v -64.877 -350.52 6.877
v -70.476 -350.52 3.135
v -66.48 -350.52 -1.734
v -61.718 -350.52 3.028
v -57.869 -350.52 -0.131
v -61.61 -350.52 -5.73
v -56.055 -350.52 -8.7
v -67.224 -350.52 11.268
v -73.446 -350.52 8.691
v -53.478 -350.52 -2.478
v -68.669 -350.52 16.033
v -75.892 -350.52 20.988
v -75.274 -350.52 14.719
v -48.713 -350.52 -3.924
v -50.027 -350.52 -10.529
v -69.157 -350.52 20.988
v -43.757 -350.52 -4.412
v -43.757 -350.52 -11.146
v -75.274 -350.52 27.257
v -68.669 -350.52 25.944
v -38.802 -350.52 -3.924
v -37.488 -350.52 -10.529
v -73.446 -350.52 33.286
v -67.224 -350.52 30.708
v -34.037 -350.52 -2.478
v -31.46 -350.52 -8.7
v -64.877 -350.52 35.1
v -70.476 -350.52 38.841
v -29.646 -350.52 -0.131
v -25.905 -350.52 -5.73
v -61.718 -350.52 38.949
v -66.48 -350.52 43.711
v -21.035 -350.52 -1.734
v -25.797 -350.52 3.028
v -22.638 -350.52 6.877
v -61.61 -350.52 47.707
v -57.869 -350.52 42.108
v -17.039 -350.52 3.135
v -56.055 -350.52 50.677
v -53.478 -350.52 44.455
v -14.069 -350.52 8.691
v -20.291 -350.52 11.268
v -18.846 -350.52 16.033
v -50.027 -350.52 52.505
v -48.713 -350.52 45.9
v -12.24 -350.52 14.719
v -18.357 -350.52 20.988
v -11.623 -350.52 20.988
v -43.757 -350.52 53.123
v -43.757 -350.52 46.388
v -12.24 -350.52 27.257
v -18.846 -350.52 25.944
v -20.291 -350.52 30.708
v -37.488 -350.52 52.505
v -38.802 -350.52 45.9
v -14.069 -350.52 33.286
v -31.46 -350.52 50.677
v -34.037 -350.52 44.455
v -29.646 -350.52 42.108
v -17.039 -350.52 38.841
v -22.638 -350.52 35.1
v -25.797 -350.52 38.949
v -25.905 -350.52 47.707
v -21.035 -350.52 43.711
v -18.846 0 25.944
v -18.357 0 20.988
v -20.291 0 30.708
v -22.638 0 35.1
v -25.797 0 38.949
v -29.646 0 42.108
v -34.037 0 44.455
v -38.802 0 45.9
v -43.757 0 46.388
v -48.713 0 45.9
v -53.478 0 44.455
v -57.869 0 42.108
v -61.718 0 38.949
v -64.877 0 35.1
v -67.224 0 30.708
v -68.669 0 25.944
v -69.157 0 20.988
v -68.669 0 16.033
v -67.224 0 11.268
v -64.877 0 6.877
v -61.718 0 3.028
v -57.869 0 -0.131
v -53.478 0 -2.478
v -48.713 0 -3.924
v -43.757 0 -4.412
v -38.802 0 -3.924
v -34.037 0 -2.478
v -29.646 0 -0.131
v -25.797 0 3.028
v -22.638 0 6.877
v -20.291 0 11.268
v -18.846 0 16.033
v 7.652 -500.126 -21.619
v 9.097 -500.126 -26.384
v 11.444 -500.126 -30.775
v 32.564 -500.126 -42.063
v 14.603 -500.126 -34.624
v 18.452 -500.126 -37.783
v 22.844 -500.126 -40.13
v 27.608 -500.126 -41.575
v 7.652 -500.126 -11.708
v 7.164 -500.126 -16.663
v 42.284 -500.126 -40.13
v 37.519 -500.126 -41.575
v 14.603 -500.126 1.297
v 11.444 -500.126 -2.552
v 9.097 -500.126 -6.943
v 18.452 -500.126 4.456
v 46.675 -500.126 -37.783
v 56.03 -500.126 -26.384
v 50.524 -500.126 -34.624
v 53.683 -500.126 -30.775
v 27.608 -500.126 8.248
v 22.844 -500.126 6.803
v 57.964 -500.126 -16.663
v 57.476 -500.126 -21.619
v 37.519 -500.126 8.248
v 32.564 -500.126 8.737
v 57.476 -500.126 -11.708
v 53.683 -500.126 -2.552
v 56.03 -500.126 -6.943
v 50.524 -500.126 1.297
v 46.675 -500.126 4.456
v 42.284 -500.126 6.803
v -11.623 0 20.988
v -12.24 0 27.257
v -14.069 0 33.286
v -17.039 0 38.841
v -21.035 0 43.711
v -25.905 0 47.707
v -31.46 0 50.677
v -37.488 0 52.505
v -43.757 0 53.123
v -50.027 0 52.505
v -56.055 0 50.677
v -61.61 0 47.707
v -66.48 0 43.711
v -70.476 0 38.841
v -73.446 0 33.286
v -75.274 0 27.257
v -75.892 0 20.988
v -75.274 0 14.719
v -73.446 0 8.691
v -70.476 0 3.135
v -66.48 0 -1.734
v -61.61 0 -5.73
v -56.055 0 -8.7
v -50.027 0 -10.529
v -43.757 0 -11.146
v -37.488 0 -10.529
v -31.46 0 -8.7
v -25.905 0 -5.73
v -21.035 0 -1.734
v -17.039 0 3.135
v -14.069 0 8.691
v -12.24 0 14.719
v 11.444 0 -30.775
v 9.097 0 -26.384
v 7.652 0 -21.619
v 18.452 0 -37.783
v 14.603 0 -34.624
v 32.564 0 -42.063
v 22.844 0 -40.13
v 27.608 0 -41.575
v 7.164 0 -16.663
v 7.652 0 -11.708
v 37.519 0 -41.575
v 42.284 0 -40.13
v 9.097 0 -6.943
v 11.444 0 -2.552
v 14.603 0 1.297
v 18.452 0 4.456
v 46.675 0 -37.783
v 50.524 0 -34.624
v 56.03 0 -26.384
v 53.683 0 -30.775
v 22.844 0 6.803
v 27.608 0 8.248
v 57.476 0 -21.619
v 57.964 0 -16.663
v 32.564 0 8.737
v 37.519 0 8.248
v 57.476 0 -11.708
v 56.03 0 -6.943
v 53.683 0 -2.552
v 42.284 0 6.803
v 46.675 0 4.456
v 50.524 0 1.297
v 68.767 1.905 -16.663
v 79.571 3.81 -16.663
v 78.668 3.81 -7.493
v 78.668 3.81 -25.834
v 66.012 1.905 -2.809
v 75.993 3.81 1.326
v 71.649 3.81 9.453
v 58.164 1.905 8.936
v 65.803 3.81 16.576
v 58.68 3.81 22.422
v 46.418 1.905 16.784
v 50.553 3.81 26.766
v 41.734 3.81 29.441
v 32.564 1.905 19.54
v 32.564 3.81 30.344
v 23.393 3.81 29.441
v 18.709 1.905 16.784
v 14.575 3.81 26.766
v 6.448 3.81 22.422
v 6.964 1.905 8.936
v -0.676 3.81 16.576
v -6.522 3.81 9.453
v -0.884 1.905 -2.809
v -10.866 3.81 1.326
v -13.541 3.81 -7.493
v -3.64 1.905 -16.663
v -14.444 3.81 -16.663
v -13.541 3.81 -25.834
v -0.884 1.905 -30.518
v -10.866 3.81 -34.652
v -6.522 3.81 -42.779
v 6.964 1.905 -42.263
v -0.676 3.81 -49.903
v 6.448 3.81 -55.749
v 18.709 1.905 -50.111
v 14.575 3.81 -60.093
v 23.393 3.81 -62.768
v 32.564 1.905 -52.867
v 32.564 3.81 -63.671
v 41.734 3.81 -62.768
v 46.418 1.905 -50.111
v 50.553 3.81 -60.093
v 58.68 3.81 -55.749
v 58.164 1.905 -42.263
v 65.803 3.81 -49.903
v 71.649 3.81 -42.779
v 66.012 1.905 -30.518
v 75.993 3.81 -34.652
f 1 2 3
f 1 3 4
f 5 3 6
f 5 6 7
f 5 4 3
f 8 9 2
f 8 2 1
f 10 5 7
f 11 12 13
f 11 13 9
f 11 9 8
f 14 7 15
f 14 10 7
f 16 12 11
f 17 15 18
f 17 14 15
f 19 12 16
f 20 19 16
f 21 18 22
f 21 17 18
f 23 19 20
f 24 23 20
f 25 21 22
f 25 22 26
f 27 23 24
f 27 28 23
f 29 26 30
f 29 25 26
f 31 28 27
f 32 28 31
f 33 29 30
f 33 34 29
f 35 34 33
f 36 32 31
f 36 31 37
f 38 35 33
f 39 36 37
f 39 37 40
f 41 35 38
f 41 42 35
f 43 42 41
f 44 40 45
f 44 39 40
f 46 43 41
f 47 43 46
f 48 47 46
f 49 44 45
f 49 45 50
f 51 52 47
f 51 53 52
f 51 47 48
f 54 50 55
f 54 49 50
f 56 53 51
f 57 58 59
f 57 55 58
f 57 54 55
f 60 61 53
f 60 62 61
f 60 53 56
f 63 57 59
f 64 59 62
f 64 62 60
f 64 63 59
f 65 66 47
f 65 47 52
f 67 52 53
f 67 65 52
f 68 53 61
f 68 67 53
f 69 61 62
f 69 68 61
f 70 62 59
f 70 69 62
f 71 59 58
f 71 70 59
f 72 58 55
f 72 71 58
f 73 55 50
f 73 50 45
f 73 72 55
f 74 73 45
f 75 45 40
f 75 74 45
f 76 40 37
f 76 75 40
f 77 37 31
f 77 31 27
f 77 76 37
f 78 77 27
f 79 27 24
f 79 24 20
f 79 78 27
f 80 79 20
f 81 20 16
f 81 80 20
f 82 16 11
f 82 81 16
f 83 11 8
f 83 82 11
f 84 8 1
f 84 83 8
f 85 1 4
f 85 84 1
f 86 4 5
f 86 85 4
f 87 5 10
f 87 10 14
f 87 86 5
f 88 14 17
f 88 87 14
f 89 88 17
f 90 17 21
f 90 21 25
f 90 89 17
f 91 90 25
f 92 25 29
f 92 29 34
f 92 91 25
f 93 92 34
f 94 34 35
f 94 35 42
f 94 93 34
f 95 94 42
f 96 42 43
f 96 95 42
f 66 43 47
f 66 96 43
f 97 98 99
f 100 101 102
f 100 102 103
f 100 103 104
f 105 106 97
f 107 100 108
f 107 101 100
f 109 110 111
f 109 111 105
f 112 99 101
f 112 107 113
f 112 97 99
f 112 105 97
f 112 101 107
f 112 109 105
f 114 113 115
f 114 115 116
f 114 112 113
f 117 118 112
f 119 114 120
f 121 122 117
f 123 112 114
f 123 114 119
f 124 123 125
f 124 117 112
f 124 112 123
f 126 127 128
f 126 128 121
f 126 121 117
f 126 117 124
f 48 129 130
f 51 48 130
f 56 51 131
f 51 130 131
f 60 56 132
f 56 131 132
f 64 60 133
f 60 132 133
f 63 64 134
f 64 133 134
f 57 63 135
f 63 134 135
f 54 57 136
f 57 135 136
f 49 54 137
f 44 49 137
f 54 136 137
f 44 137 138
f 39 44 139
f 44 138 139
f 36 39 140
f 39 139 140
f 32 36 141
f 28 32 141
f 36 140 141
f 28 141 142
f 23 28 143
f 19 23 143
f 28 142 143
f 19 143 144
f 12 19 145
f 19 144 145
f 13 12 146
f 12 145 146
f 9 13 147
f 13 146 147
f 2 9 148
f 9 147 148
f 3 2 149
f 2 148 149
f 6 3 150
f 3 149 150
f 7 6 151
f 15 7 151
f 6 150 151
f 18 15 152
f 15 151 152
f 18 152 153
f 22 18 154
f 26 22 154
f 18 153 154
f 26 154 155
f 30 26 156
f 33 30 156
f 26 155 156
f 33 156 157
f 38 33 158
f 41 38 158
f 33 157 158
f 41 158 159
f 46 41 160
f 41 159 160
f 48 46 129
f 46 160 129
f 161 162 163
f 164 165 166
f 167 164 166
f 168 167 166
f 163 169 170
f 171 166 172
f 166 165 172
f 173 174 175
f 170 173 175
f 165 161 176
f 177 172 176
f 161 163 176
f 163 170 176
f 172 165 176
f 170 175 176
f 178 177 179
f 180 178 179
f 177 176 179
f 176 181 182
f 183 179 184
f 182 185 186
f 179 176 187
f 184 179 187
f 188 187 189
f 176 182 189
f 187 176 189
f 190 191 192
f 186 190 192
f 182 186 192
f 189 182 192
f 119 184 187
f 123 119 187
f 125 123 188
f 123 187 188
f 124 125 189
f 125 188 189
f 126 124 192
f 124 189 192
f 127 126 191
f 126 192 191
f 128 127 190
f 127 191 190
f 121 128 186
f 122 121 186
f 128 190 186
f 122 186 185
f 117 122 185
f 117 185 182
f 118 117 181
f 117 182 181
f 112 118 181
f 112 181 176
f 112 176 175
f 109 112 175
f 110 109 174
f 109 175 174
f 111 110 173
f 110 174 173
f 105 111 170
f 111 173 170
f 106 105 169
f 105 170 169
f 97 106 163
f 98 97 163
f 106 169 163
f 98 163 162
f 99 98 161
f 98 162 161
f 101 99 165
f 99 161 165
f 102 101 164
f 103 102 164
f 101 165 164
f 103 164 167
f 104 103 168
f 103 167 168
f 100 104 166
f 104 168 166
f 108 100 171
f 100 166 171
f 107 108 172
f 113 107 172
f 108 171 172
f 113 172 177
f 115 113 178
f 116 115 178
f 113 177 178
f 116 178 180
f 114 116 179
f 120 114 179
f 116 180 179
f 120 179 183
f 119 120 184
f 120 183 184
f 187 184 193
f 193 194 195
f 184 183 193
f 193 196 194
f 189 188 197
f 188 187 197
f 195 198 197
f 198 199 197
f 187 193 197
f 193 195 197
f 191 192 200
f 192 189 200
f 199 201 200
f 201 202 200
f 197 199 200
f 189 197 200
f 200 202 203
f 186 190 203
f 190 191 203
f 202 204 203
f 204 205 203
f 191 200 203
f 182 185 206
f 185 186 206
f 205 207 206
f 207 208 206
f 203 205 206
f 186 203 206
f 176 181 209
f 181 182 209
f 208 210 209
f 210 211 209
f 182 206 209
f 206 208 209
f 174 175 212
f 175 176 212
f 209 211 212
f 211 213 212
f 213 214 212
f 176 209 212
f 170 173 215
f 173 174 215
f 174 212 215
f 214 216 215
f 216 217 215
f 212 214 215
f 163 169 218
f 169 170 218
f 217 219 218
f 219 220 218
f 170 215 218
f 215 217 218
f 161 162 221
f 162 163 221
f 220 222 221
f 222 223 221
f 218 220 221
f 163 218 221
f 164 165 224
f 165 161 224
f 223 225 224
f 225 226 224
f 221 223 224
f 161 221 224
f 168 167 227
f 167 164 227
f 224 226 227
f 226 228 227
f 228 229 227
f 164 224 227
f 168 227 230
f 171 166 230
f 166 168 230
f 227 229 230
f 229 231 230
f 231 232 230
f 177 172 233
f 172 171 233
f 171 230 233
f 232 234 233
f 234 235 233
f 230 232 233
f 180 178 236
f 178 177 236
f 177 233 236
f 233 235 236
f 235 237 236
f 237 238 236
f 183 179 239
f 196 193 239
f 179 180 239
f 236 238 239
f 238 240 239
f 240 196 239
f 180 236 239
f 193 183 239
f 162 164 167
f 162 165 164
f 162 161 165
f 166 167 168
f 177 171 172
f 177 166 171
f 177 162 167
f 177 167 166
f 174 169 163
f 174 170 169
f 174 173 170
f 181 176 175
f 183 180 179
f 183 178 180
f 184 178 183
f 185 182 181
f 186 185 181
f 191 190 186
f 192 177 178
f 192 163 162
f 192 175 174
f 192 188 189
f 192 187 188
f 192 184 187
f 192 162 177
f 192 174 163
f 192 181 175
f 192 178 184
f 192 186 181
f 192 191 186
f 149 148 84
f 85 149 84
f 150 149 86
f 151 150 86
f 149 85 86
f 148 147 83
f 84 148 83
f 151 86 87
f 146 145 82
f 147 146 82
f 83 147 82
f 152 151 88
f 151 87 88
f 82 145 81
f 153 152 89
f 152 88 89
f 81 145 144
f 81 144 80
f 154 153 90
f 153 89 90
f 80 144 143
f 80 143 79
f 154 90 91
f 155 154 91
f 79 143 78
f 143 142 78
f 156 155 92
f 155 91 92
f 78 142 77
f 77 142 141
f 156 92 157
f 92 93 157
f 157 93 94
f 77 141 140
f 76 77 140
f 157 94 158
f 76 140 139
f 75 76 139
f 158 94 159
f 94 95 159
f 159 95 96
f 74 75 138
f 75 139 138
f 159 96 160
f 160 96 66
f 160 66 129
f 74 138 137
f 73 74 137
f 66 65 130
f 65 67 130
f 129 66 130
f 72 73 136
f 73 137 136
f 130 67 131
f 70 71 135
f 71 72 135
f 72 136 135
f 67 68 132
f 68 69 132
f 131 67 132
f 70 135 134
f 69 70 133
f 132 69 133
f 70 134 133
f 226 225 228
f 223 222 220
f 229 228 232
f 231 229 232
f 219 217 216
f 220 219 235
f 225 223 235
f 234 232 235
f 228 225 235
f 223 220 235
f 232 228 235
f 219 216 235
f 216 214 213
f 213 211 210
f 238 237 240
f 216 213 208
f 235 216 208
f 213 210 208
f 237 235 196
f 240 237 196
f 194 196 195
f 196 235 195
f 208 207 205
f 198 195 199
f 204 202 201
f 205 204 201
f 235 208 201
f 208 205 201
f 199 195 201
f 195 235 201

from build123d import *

# Parameters (mm, degrees)
F0_R     = 32.1344290403
F0_R_2   = 25.4
F1_DEPTH = 350.52
F2_DEPTH = 500.126
F3_DEPTH = 3.81
F3_TAPER = -80


with BuildPart() as f1:
    # F0 (on Front) → F1 (new body)
    with BuildSketch(Plane.XZ):
        with Locations((-43.7574572861, 20.9883153439)):
            Circle(F0_R)
        with Locations((-43.7574572861, 20.9883153439)):
            Circle(F0_R_2, mode=Mode.SUBTRACT)
    extrude(amount=F1_DEPTH)


with BuildPart() as f2:
    # F0 (on Front) → F2 (new body)
    with BuildSketch(Plane.XZ):
        with Locations((32.5636900961, -16.6634507477)):
            Circle(F0_R_2)
    extrude(amount=F2_DEPTH)


with BuildPart() as f3:
    # F0 (on Front) → F3 (new body)
    with BuildSketch(Plane.XZ):
        with Locations((32.5636900961, -16.6634507477)):
            Circle(F0_R_2)
    extrude(amount=-F3_DEPTH, taper=F3_TAPER)


solid = Compound([f1.part, f2.part, f3.part])
